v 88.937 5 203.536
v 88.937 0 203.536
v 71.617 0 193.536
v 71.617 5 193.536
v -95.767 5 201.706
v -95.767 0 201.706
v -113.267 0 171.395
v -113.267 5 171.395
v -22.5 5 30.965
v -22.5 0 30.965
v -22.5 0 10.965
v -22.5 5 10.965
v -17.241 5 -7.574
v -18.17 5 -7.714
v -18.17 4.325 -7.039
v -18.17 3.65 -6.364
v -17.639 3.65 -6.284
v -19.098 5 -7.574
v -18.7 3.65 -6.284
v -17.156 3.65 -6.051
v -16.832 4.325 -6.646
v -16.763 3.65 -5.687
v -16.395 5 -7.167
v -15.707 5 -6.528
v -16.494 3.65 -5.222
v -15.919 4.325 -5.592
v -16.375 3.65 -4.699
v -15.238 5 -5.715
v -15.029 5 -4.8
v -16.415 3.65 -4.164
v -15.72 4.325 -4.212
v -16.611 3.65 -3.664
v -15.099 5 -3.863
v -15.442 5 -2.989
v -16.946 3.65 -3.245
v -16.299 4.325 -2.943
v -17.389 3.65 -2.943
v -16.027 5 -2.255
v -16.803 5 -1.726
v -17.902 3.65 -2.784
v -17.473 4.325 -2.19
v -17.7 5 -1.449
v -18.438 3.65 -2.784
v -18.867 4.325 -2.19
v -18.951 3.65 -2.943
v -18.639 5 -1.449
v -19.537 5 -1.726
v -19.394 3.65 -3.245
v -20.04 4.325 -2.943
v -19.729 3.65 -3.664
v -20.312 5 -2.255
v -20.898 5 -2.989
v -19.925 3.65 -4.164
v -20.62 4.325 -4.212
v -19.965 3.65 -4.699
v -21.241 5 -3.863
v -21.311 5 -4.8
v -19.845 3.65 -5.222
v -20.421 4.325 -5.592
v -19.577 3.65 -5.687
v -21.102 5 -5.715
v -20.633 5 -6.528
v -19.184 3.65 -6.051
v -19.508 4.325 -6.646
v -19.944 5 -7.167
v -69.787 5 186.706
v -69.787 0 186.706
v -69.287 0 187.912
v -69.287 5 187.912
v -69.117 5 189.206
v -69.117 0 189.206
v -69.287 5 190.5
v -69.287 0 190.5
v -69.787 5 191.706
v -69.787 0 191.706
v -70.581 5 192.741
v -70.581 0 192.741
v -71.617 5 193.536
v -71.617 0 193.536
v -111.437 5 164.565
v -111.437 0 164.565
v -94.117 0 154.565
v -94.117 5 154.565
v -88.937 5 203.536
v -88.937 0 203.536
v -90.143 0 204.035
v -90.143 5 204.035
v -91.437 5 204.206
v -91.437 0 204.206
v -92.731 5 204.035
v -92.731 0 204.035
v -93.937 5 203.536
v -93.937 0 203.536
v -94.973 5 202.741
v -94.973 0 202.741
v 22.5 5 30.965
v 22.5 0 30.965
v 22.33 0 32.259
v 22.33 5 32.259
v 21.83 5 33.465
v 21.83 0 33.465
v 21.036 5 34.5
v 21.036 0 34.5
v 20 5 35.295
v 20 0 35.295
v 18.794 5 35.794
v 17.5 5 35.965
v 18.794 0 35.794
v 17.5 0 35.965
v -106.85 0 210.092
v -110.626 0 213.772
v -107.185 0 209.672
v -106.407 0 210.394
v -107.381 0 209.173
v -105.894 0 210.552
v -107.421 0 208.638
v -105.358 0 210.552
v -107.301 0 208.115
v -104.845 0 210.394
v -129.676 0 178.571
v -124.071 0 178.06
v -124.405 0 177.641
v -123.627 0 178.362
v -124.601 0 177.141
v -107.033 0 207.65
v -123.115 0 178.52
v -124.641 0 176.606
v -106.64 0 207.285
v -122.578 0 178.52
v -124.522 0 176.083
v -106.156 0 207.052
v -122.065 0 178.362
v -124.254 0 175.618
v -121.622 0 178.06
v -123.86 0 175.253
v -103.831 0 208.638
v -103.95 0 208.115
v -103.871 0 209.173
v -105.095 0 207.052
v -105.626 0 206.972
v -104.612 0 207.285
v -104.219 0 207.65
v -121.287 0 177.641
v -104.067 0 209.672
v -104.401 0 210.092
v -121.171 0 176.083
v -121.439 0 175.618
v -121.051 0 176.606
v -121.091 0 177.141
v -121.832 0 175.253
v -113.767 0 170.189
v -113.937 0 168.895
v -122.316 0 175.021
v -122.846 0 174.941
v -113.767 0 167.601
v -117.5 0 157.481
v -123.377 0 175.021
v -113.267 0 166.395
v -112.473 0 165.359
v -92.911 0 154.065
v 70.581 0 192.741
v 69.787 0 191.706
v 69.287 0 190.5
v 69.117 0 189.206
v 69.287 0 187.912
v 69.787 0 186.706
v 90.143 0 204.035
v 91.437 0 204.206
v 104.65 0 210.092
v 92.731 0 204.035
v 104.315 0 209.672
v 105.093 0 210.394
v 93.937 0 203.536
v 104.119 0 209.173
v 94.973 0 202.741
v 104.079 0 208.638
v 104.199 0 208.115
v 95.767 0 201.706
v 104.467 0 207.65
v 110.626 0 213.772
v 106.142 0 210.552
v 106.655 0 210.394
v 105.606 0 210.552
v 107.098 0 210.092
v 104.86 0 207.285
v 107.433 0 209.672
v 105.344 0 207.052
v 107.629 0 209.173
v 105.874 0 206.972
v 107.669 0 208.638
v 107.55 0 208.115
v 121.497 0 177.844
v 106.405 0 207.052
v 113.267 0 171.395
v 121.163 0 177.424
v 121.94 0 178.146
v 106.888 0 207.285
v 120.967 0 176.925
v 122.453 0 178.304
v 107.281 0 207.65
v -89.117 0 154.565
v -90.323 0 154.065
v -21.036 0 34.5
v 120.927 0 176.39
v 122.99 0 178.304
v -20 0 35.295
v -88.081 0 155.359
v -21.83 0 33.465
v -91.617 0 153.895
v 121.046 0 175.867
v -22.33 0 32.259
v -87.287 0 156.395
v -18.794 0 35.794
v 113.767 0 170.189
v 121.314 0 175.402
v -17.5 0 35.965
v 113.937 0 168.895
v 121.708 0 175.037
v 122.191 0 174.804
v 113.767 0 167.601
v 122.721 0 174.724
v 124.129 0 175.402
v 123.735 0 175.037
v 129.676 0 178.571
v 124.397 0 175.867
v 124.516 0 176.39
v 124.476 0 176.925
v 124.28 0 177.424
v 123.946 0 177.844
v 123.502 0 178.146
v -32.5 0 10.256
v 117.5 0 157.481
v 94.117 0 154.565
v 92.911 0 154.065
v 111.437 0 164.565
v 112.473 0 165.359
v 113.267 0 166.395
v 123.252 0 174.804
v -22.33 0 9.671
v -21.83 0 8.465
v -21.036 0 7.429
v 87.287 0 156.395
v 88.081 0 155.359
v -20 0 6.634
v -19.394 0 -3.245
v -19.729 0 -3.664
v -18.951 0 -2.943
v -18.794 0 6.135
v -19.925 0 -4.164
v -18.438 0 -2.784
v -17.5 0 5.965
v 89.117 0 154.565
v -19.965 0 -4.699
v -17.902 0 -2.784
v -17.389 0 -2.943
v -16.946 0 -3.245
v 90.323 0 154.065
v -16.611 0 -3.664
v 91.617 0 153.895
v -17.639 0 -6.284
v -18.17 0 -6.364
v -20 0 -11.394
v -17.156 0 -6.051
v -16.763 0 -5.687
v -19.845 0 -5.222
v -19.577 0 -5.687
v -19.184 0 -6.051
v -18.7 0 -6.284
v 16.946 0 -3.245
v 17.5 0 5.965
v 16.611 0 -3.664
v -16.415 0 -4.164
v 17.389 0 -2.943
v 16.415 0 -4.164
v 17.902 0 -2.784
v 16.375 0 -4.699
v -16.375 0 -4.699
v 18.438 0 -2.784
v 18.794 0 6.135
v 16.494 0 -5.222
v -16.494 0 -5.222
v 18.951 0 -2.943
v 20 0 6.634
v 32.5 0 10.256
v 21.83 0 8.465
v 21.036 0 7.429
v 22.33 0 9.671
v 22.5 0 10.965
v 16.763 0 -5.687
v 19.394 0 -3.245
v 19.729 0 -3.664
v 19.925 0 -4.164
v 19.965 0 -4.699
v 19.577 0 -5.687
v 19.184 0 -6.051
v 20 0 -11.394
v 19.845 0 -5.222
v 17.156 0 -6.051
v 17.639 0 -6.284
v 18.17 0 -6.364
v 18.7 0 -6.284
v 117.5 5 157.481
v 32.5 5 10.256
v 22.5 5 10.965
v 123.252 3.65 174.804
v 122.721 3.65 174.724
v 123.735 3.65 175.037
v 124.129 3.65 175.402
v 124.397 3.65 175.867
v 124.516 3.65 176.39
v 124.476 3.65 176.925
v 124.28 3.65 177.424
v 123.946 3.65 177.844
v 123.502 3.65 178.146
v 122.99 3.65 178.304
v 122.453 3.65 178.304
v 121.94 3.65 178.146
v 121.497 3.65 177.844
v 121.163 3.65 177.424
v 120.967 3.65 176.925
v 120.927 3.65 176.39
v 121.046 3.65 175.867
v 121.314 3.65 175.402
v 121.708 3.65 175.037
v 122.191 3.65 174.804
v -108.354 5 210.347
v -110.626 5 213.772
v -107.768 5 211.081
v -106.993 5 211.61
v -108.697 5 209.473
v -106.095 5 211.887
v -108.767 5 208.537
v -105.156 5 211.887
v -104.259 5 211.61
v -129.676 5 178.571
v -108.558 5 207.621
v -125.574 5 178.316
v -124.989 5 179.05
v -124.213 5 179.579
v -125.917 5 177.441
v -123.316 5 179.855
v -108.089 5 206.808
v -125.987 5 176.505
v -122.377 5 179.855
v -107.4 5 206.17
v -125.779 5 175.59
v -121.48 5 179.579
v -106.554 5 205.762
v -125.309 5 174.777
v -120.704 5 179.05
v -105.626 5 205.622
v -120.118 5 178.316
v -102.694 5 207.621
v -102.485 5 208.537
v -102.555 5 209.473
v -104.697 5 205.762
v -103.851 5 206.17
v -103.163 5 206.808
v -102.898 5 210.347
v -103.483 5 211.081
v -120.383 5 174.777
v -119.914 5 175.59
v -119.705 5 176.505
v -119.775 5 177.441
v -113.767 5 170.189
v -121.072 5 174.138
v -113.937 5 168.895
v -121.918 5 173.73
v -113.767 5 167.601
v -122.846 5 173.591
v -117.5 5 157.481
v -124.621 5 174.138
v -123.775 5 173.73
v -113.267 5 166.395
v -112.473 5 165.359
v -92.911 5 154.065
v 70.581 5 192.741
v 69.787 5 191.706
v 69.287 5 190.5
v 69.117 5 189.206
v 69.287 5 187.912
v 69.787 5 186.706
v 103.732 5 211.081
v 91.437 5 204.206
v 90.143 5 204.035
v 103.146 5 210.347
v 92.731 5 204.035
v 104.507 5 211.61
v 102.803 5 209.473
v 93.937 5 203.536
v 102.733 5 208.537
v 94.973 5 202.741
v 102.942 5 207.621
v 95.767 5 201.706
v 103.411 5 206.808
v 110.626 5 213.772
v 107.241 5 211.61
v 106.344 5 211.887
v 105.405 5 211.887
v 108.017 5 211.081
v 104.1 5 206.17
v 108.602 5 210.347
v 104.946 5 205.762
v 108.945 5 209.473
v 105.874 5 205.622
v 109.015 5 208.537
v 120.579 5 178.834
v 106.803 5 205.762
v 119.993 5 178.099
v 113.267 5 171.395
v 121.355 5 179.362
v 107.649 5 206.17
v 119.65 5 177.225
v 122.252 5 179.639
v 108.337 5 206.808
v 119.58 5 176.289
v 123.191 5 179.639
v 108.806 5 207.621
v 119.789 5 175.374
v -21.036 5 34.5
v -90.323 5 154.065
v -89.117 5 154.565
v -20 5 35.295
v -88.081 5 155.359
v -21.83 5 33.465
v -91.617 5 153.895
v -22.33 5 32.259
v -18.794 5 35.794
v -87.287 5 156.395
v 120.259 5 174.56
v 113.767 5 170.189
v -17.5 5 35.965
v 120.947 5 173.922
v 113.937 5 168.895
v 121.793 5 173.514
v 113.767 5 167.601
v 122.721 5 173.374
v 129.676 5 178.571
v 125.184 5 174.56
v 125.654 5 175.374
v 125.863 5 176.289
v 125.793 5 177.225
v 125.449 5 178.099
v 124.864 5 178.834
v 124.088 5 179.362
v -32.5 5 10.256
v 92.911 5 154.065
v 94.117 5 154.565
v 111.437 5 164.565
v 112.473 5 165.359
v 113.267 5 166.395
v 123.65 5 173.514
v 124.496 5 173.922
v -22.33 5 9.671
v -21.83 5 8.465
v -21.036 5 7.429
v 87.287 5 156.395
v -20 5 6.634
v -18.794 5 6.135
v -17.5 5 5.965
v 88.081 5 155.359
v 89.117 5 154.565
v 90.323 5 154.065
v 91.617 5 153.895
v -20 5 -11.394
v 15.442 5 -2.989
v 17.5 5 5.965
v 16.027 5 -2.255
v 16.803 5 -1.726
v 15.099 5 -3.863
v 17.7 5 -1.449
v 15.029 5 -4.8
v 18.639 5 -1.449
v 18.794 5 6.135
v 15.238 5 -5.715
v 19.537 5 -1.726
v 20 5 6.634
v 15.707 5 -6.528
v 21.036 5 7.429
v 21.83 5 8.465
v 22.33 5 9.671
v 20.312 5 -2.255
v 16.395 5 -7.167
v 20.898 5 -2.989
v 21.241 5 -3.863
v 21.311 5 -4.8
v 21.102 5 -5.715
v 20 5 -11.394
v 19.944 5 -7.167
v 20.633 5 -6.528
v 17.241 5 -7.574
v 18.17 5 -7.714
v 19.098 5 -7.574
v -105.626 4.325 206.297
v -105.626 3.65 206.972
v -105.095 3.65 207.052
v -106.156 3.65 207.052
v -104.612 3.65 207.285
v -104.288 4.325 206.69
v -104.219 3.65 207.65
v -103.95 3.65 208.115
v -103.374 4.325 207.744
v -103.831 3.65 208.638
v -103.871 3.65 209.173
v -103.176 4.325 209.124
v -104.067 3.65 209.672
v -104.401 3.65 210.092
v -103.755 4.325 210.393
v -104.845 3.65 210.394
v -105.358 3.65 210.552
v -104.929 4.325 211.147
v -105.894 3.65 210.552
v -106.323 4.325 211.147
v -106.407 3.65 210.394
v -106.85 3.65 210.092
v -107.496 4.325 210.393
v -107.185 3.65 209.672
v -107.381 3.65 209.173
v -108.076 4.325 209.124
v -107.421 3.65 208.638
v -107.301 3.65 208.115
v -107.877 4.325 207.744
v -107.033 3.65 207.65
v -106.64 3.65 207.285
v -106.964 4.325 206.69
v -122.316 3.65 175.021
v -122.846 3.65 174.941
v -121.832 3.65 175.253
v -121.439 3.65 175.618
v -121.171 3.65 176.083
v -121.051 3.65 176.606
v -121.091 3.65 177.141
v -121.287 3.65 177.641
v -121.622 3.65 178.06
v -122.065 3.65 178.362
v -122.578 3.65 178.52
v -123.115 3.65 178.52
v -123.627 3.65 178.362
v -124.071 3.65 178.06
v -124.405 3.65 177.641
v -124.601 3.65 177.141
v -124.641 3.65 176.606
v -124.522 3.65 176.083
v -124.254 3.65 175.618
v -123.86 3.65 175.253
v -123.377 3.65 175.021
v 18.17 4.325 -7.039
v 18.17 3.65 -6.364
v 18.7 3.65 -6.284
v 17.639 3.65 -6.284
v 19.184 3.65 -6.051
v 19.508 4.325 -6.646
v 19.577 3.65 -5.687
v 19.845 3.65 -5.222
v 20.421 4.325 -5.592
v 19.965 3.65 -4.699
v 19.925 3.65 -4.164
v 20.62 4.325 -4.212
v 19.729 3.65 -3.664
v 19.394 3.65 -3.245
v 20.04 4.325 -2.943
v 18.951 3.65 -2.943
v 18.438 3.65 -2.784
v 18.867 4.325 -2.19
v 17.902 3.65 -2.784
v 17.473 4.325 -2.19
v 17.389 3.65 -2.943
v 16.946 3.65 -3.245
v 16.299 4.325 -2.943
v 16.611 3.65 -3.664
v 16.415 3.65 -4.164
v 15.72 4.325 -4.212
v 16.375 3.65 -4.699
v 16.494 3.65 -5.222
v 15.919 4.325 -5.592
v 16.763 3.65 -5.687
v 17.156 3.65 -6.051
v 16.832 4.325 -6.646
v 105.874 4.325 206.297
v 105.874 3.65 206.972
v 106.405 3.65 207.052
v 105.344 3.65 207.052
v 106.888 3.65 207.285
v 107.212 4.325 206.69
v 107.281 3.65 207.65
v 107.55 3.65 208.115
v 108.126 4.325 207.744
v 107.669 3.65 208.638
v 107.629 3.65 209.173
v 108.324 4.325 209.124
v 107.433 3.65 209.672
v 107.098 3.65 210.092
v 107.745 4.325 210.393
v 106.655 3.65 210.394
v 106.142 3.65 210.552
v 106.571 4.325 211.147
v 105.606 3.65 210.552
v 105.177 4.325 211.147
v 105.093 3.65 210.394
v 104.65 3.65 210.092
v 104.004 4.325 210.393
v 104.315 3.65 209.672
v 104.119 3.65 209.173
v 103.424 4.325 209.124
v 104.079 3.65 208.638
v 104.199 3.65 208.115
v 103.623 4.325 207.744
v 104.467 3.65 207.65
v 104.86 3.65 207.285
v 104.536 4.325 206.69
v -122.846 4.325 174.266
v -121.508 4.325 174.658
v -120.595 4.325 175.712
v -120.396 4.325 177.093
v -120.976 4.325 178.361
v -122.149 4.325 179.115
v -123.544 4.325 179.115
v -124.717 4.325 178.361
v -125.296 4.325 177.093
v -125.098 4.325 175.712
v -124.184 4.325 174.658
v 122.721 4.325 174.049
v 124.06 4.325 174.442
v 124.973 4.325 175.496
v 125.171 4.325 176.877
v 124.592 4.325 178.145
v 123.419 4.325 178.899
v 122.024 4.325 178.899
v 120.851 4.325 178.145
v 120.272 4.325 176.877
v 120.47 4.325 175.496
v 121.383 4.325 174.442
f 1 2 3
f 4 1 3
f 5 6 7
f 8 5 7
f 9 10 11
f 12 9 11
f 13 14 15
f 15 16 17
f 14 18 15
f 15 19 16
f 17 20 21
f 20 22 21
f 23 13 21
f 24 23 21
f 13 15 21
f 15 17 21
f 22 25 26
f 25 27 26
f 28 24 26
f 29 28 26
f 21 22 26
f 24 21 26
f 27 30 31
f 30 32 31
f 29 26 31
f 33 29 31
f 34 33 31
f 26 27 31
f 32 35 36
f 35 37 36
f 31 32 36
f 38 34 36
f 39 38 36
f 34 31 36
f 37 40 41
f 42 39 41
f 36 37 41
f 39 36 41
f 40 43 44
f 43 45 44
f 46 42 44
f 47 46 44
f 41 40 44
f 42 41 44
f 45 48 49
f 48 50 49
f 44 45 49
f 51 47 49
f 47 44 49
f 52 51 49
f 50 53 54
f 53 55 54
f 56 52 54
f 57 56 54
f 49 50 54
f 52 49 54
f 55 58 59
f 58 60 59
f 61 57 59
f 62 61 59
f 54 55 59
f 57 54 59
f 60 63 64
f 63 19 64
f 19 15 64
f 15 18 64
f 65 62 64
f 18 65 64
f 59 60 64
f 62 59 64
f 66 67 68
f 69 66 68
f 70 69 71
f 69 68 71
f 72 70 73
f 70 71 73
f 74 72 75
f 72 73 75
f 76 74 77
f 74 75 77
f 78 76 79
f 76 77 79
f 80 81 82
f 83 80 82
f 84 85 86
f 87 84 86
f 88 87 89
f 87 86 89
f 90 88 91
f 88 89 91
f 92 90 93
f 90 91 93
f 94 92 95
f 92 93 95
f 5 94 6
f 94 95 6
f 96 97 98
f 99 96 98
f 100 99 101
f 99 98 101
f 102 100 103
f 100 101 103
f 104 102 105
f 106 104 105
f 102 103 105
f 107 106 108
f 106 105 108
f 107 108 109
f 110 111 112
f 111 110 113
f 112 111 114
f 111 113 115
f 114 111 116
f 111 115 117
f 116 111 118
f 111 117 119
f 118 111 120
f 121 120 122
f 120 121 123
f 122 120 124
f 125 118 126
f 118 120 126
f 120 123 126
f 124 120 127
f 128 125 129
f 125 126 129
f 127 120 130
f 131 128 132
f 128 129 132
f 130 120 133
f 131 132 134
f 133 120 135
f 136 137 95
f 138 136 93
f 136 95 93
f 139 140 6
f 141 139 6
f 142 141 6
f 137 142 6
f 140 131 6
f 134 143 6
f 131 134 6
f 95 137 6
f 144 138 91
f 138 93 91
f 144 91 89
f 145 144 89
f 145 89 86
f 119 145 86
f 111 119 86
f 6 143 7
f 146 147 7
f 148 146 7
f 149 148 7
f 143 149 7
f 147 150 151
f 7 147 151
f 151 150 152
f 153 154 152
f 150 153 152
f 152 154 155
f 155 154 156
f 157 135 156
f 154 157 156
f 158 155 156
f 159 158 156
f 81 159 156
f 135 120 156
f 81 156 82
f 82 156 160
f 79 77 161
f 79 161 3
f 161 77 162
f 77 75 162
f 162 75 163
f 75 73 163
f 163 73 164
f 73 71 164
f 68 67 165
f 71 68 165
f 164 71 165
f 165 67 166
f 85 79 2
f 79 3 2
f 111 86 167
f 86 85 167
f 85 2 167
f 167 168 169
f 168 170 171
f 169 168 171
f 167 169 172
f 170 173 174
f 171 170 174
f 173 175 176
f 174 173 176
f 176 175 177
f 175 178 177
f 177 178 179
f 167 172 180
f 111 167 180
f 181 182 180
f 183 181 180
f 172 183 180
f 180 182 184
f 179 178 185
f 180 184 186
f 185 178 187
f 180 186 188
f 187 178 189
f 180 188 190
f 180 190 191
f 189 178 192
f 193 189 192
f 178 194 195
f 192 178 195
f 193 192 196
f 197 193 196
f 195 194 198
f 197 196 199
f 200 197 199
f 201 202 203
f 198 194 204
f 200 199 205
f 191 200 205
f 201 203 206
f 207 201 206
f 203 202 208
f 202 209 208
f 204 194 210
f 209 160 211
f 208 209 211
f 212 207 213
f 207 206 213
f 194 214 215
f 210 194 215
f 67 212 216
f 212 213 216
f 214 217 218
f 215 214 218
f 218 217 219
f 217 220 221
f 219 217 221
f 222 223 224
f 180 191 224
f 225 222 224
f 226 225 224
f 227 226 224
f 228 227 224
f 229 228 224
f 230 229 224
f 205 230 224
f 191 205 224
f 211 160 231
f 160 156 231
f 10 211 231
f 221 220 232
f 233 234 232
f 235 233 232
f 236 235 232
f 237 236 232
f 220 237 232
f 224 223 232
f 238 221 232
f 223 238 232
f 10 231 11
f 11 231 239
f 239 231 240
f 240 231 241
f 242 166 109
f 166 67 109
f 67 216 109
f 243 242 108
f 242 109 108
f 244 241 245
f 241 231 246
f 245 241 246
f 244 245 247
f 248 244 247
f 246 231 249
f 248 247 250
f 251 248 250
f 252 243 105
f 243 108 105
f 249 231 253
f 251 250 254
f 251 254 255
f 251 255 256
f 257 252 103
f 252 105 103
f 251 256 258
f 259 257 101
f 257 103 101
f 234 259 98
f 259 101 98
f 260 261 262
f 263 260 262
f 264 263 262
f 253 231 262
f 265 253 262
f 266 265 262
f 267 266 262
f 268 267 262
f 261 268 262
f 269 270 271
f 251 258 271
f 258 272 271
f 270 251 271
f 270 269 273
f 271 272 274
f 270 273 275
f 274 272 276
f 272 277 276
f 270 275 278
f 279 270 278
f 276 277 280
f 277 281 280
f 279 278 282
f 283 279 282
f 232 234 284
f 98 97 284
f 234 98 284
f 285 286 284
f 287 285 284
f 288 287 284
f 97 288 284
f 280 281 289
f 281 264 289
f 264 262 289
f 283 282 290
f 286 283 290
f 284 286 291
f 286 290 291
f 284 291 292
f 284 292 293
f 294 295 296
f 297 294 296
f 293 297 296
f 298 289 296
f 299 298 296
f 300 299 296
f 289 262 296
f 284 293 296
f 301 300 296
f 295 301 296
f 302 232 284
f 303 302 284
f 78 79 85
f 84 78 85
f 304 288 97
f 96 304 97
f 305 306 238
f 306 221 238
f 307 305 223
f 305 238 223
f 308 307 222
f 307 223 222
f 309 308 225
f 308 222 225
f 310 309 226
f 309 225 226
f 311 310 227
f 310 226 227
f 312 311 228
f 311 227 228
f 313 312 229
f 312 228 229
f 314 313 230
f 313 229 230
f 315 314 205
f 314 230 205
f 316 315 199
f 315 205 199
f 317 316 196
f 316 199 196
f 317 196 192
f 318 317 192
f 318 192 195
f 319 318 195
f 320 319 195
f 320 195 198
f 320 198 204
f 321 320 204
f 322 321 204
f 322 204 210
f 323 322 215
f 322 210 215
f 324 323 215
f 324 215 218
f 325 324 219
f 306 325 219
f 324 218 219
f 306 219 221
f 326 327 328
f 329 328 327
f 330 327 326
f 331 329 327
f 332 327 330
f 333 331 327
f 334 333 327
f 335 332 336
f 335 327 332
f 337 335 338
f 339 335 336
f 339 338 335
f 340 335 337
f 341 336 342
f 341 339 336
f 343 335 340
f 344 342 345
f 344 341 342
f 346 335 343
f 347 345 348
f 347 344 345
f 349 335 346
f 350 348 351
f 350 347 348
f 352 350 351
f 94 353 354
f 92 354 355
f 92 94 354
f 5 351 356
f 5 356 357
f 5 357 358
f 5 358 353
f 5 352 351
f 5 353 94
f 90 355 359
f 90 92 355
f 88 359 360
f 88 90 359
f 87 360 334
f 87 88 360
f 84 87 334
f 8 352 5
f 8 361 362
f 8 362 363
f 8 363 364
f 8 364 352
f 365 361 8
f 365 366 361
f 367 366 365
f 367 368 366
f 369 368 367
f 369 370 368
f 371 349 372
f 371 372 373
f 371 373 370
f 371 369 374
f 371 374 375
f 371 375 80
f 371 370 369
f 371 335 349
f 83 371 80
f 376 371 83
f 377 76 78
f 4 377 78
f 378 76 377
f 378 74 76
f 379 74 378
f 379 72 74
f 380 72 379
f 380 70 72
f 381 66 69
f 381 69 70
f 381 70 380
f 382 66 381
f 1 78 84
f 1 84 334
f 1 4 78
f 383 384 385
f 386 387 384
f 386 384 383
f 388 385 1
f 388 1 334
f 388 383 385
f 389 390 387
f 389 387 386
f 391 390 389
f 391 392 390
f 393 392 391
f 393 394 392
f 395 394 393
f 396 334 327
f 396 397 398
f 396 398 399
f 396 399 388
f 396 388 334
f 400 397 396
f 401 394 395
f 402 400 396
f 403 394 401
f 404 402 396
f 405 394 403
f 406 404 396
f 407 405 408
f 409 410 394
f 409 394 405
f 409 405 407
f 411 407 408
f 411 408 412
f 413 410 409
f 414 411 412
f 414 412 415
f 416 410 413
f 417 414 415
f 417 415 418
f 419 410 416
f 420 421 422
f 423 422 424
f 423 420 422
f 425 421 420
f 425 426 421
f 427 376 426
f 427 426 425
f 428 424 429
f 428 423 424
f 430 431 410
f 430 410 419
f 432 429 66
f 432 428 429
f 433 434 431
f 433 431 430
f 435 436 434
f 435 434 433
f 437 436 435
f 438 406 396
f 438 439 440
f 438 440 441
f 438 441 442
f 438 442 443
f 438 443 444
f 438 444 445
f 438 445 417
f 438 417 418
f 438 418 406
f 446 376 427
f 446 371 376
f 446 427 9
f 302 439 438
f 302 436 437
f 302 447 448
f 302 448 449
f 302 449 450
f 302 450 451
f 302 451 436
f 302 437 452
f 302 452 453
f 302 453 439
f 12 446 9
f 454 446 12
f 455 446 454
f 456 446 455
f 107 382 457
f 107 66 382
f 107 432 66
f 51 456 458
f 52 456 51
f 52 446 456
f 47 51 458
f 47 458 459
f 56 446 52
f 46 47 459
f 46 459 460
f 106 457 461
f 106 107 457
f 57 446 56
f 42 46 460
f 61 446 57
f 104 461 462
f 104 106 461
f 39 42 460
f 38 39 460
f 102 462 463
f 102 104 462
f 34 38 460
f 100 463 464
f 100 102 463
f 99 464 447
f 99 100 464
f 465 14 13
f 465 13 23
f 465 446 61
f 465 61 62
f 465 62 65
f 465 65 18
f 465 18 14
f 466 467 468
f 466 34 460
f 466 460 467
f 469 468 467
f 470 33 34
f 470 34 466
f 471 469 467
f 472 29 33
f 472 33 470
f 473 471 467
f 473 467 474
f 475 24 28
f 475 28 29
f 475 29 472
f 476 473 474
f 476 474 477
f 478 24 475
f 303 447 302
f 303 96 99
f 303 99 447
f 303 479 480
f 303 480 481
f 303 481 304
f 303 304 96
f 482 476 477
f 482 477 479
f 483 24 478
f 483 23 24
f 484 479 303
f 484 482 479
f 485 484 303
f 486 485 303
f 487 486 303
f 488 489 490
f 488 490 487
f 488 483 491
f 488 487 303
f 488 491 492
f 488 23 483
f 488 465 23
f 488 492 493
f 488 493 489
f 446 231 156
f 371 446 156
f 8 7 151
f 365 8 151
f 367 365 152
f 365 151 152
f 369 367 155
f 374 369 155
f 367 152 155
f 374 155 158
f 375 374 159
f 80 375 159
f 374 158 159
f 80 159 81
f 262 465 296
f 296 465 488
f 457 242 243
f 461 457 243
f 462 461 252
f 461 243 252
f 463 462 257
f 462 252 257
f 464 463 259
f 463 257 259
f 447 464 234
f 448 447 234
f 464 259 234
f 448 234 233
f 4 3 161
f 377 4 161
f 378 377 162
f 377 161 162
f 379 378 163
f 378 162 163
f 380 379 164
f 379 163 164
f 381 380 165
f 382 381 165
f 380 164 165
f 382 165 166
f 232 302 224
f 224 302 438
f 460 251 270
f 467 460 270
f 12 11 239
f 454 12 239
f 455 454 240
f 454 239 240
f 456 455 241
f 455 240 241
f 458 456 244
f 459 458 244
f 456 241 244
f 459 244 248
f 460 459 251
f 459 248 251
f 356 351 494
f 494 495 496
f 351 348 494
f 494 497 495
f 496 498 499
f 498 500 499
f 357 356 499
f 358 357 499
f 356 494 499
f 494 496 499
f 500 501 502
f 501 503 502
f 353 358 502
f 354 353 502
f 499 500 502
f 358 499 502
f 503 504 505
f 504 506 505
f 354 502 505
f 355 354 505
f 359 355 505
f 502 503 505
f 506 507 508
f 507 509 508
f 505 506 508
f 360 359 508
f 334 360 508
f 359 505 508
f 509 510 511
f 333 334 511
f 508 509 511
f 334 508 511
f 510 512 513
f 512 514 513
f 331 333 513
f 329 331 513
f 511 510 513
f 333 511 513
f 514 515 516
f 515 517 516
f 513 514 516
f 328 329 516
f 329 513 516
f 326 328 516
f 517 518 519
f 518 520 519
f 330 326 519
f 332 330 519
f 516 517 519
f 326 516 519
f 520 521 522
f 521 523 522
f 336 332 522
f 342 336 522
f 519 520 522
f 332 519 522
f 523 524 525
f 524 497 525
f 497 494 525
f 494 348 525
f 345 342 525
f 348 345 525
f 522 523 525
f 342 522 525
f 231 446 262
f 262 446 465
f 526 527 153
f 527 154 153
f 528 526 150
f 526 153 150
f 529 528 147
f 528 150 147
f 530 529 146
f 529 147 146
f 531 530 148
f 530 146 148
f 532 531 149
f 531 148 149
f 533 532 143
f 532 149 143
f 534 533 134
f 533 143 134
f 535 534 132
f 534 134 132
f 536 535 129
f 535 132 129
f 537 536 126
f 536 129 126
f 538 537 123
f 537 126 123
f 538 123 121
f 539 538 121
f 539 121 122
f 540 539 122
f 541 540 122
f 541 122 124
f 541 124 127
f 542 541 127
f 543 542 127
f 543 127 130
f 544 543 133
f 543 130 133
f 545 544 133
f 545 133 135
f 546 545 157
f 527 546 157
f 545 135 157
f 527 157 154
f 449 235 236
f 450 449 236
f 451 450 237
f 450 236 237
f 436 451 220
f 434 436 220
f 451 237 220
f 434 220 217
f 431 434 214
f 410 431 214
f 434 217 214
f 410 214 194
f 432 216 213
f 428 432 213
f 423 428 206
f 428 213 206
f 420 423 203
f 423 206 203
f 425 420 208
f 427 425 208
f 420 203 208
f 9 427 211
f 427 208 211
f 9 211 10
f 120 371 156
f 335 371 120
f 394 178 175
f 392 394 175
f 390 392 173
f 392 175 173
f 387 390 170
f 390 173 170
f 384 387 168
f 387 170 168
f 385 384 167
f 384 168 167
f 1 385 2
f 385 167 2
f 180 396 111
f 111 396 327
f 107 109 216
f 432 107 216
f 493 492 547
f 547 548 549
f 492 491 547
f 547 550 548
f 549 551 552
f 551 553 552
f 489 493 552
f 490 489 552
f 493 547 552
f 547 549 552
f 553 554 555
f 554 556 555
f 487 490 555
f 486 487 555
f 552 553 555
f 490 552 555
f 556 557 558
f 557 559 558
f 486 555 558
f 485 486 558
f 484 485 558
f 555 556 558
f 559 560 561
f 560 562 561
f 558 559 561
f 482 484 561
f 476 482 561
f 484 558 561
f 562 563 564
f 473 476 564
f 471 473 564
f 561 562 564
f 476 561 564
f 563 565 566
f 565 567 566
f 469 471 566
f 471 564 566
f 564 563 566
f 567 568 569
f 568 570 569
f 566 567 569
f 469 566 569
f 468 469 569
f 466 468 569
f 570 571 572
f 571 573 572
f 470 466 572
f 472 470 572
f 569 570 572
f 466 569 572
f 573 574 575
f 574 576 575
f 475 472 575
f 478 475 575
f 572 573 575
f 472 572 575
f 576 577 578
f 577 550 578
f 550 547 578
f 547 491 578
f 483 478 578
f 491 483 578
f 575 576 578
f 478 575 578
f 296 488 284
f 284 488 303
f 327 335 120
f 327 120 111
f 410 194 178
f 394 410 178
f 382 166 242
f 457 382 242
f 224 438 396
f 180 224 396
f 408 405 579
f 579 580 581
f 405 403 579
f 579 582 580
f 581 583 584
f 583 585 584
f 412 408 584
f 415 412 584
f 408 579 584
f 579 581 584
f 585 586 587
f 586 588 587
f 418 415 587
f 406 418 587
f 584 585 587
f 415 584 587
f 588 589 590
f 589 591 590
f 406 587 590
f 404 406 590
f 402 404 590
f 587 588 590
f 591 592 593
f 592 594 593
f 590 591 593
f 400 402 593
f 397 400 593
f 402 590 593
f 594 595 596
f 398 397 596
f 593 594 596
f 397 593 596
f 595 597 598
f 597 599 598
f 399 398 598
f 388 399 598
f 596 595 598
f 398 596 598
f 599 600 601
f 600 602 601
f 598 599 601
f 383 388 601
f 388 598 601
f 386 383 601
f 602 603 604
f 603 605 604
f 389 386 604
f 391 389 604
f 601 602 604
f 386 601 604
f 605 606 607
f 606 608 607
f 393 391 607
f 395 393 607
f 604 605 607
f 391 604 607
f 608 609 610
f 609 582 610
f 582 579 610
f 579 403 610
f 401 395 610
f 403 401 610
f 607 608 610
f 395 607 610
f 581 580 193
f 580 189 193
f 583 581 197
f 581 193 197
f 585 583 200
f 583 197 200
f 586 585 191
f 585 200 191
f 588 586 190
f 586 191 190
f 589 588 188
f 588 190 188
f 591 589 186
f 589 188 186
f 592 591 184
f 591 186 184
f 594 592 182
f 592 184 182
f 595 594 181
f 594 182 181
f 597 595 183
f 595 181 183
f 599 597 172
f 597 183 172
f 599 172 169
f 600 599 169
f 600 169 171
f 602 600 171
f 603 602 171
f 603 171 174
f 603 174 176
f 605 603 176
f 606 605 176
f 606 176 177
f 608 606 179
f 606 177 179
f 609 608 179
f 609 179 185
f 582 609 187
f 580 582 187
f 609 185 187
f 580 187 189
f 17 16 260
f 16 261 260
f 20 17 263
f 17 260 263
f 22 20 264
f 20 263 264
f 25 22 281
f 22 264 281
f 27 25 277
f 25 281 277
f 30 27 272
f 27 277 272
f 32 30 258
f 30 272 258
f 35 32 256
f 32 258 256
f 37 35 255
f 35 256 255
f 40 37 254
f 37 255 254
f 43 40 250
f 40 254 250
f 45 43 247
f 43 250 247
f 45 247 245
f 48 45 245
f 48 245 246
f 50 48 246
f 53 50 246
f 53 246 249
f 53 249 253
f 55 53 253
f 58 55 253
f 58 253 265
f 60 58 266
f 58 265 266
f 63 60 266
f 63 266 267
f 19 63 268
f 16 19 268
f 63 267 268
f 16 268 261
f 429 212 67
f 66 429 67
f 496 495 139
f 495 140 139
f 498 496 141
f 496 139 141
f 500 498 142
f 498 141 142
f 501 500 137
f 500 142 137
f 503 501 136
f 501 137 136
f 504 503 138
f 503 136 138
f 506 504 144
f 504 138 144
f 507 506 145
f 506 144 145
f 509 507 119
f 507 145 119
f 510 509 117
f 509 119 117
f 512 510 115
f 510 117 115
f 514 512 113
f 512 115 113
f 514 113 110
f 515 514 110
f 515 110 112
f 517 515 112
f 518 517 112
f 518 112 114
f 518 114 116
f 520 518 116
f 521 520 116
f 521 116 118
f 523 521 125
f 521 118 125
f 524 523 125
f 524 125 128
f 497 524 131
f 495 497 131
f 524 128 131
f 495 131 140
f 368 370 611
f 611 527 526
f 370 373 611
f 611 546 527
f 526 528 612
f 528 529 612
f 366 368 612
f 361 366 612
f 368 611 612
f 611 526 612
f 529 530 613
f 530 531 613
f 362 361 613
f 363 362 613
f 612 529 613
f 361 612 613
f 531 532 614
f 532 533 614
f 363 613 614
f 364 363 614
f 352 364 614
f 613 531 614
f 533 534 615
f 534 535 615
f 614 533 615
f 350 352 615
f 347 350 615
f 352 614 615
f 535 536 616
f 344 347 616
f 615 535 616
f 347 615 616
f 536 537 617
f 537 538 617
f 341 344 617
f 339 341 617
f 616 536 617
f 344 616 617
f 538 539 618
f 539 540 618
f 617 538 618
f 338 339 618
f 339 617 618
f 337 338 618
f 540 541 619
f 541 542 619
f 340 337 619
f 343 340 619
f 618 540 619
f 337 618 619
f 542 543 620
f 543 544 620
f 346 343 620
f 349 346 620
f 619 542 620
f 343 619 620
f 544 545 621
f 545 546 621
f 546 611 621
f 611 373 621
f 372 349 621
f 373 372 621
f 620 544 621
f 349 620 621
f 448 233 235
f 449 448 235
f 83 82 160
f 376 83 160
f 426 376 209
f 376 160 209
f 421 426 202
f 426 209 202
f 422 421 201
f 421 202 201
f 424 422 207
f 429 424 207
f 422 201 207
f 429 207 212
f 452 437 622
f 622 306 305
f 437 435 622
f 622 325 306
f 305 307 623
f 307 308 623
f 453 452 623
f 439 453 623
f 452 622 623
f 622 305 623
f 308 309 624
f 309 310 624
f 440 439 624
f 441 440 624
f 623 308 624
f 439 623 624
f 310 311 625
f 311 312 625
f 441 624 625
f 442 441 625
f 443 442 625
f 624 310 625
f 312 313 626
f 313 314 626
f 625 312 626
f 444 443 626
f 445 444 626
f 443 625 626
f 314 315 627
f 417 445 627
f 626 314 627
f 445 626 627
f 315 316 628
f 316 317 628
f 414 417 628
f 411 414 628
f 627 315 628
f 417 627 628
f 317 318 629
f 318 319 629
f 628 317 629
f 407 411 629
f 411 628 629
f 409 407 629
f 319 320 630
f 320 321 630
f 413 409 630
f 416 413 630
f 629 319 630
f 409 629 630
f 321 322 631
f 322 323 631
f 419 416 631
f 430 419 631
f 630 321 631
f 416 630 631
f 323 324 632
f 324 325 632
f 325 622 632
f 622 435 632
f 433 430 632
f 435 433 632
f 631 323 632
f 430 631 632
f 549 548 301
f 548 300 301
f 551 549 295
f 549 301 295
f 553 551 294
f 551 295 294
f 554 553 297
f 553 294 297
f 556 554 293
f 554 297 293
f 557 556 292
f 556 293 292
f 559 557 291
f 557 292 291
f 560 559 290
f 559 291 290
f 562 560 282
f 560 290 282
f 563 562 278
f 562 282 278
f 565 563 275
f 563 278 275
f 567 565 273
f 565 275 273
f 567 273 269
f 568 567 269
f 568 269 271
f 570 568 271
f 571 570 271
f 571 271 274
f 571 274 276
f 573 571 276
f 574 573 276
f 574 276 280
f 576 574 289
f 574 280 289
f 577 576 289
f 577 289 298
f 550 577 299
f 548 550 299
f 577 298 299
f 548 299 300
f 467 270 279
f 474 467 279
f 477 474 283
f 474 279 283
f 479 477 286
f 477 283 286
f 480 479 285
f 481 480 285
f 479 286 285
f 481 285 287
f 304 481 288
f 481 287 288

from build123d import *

# Parameters (mm, degrees)
BOSS_EXTRU_1_DEPTH                                = 5
FRAISAGE_POUR_T_TE_FRAIS_E_BOMB_E_M31_D           = 3.6
FRAISAGE_POUR_T_TE_FRAIS_E_BOMB_E_M31_CSINK_D     = 6.3
FRAISAGE_POUR_T_TE_FRAIS_E_BOMB_E_M31_CSINK_ANGLE = 90
ENL_V_MAT_EXTRU_1_DEPTH                           = 10


with BuildPart() as part:
    # Esquisse1 → Boss.-Extru.1 (new body)
    with BuildSketch(Plane(origin=(0, 0, 0), x_dir=(1, 0, 0), z_dir=(0, 1, 0))):
        with BuildLine():
            Line((-32.5, -10.256252677), (-117.5, -157.48057132))
            Line((-117.5, -157.48057132), (-169.461524227, -187.48057132))
            ThreePointArc((-169.461524227, -187.48057132), (-178.328455444, -230.127663943), (-136.961524227, -243.772222566))
            Line((-136.961524227, -243.772222566), (-85, -213.772222566))
            Line((-85, -213.772222566), (85, -213.772222566))
            Line((85, -213.772222566), (136.961524227, -243.772222566))
            ThreePointArc((136.961524227, -243.772222566), (178.328455444, -230.127663943), (169.461524227, -187.48057132))
            Line((169.461524227, -187.48057132), (117.5, -157.48057132))
            Line((117.5, -157.48057132), (32.5, -10.256252677))
            Line((32.5, -10.256252677), (32.5, 49.743747323))
            ThreePointArc((32.5, 49.743747323), (0, 78.746281322), (-32.5, 49.743747323))
            Line((-32.5, 49.743747323), (-32.5, -10.256252677))
        make_face()
        with BuildLine():
            ThreePointArc((-88.937370367, -203.535799534), (-92.731465593, -204.035301647), (-95.767497386, -201.705672515))
            Line((-95.767497386, -201.705672515), (-113.267497386, -171.394783383))
            ThreePointArc((-113.267497386, -171.394783383), (-113.766999499, -167.600688157), (-111.437370367, -164.564656364))
            Line((-111.437370367, -164.564656364), (-94.116862291, -154.564656364))
            ThreePointArc((-94.116862291, -154.564656364), (-90.322767066, -154.065154251), (-87.286735273, -156.394783383))
            Line((-87.286735273, -156.394783383), (-69.786735273, -186.705672515))
            ThreePointArc((-69.786735273, -186.705672515), (-69.28723316, -190.499767741), (-71.616862291, -193.535799534))
            Line((-71.616862291, -193.535799534), (-88.937370367, -203.535799534))
        make_face(mode=Mode.SUBTRACT)
        with BuildLine():
            ThreePointArc((71.616862291, -193.535799534), (69.28723316, -190.499767741), (69.786735273, -186.705672515))
            Line((69.786735273, -186.705672515), (87.286735273, -156.394783383))
            ThreePointArc((87.286735273, -156.394783383), (90.322767066, -154.065154251), (94.116862291, -154.564656364))
            Line((94.116862291, -154.564656364), (111.437370367, -164.564656364))
            ThreePointArc((111.437370367, -164.564656364), (113.766999499, -167.600688157), (113.267497386, -171.394783383))
            Line((113.267497386, -171.394783383), (95.767497386, -201.705672515))
            ThreePointArc((95.767497386, -201.705672515), (92.731465593, -204.035301647), (88.937370367, -203.535799534))
            Line((88.937370367, -203.535799534), (71.616862291, -193.535799534))
        make_face(mode=Mode.SUBTRACT)
        with BuildLine():
            Line((17.5, -35.964601431), (-17.5, -35.964601431))
            ThreePointArc((-17.5, -35.964601431), (-21.035533906, -34.500135337), (-22.5, -30.964601431))
            Line((-22.5, -30.964601431), (-22.5, -10.964601431))
            ThreePointArc((-22.5, -10.964601431), (-21.035533906, -7.429067525), (-17.5, -5.964601431))
            Line((-17.5, -5.964601431), (17.5, -5.964601431))
            ThreePointArc((17.5, -5.964601431), (21.035533906, -7.429067525), (22.5, -10.964601431))
            Line((22.5, -10.964601431), (22.5, -30.964601431))
            ThreePointArc((22.5, -30.964601431), (21.035533906, -34.500135337), (17.5, -35.964601431))
        make_face(mode=Mode.SUBTRACT)
    extrude(amount=BOSS_EXTRU_1_DEPTH)

    # Fraisage pour tête fraisée bombée M31 (through all)
    with Locations(Plane(origin=(18.169872981, 5, -4.564255399), x_dir=(0, 0, 1), z_dir=(0, 1, 0))):
        with Locations((0, 0), (181.304804312, -141.016123537), (213.336477965, -123.795670618), (0, -36.339745962), (181.088690368, 104.551604131), (213.336477965, 87.70428834)):
            CounterSinkHole(FRAISAGE_POUR_T_TE_FRAIS_E_BOMB_E_M31_D / 2, FRAISAGE_POUR_T_TE_FRAIS_E_BOMB_E_M31_CSINK_D / 2, counter_sink_angle=FRAISAGE_POUR_T_TE_FRAIS_E_BOMB_E_M31_CSINK_ANGLE)

    # Esquisse5 → Enlèv. mat.-Extru.1 (cut)
    with BuildSketch(Plane(origin=(0, 5, 0), x_dir=(1, 0, 0), z_dir=(0, 1, 0))):
        with BuildLine():
            Line((-117.5, -157.48057132), (-129.676377575, -178.570675931))
            Line((-129.676377575, -178.570675931), (-110.625797637, -213.772222566))
            Line((-110.625797637, -213.772222566), (-85, -213.772222566))
            add(Edge.make_bspline(
                [(-117.5, -157.48057132), (-151.940688813, -148.613043489), (-277.037698094, -222.560603045), (-150.450766074, -316.414471558), (-56.420377815, -257.105249939), (-85, -213.772222566)],
                knots=[0, 0, 0, 0, 0.411814668, 0.638484528, 1, 1, 1, 1], degree=3))
        make_face()
        with BuildLine():
            Line((-32.5, -10.256252677), (-20, 11.394382418))
            Line((-20, 11.394382418), (20, 11.394382418))
            Line((20, 11.394382418), (32.5, -10.256252677))
            add(Edge.make_bspline(
                [(0, 98.703141202), (74.821178569, 66.789103835), (32.5, -10.256252677)],
                knots=[0, 0, 0, 1, 1, 1], degree=2))
            add(Edge.make_bspline(
                [(0, 98.703141202), (-74.821178569, 66.789103835), (-32.5, -10.256252677)],
                knots=[0, 0, 0, 1, 1, 1], degree=2))
        make_face()
        with BuildLine():
            Line((117.5, -157.48057132), (129.676377575, -178.570675931))
            Line((129.676377575, -178.570675931), (110.625797637, -213.772222566))
            Line((110.625797637, -213.772222566), (85, -213.772222566))
            add(Edge.make_bspline(
                [(117.5, -157.48057132), (151.940688813, -148.613043489), (277.037698094, -222.560603045), (150.450766074, -316.414471558), (56.420377815, -257.105249939), (85, -213.772222566)],
                knots=[0, 0, 0, 0, 0.411814668, 0.638484528, 1, 1, 1, 1], degree=3))
        make_face()
    extrude(amount=-ENL_V_MAT_EXTRU_1_DEPTH, mode=Mode.SUBTRACT)


solid = part.part
